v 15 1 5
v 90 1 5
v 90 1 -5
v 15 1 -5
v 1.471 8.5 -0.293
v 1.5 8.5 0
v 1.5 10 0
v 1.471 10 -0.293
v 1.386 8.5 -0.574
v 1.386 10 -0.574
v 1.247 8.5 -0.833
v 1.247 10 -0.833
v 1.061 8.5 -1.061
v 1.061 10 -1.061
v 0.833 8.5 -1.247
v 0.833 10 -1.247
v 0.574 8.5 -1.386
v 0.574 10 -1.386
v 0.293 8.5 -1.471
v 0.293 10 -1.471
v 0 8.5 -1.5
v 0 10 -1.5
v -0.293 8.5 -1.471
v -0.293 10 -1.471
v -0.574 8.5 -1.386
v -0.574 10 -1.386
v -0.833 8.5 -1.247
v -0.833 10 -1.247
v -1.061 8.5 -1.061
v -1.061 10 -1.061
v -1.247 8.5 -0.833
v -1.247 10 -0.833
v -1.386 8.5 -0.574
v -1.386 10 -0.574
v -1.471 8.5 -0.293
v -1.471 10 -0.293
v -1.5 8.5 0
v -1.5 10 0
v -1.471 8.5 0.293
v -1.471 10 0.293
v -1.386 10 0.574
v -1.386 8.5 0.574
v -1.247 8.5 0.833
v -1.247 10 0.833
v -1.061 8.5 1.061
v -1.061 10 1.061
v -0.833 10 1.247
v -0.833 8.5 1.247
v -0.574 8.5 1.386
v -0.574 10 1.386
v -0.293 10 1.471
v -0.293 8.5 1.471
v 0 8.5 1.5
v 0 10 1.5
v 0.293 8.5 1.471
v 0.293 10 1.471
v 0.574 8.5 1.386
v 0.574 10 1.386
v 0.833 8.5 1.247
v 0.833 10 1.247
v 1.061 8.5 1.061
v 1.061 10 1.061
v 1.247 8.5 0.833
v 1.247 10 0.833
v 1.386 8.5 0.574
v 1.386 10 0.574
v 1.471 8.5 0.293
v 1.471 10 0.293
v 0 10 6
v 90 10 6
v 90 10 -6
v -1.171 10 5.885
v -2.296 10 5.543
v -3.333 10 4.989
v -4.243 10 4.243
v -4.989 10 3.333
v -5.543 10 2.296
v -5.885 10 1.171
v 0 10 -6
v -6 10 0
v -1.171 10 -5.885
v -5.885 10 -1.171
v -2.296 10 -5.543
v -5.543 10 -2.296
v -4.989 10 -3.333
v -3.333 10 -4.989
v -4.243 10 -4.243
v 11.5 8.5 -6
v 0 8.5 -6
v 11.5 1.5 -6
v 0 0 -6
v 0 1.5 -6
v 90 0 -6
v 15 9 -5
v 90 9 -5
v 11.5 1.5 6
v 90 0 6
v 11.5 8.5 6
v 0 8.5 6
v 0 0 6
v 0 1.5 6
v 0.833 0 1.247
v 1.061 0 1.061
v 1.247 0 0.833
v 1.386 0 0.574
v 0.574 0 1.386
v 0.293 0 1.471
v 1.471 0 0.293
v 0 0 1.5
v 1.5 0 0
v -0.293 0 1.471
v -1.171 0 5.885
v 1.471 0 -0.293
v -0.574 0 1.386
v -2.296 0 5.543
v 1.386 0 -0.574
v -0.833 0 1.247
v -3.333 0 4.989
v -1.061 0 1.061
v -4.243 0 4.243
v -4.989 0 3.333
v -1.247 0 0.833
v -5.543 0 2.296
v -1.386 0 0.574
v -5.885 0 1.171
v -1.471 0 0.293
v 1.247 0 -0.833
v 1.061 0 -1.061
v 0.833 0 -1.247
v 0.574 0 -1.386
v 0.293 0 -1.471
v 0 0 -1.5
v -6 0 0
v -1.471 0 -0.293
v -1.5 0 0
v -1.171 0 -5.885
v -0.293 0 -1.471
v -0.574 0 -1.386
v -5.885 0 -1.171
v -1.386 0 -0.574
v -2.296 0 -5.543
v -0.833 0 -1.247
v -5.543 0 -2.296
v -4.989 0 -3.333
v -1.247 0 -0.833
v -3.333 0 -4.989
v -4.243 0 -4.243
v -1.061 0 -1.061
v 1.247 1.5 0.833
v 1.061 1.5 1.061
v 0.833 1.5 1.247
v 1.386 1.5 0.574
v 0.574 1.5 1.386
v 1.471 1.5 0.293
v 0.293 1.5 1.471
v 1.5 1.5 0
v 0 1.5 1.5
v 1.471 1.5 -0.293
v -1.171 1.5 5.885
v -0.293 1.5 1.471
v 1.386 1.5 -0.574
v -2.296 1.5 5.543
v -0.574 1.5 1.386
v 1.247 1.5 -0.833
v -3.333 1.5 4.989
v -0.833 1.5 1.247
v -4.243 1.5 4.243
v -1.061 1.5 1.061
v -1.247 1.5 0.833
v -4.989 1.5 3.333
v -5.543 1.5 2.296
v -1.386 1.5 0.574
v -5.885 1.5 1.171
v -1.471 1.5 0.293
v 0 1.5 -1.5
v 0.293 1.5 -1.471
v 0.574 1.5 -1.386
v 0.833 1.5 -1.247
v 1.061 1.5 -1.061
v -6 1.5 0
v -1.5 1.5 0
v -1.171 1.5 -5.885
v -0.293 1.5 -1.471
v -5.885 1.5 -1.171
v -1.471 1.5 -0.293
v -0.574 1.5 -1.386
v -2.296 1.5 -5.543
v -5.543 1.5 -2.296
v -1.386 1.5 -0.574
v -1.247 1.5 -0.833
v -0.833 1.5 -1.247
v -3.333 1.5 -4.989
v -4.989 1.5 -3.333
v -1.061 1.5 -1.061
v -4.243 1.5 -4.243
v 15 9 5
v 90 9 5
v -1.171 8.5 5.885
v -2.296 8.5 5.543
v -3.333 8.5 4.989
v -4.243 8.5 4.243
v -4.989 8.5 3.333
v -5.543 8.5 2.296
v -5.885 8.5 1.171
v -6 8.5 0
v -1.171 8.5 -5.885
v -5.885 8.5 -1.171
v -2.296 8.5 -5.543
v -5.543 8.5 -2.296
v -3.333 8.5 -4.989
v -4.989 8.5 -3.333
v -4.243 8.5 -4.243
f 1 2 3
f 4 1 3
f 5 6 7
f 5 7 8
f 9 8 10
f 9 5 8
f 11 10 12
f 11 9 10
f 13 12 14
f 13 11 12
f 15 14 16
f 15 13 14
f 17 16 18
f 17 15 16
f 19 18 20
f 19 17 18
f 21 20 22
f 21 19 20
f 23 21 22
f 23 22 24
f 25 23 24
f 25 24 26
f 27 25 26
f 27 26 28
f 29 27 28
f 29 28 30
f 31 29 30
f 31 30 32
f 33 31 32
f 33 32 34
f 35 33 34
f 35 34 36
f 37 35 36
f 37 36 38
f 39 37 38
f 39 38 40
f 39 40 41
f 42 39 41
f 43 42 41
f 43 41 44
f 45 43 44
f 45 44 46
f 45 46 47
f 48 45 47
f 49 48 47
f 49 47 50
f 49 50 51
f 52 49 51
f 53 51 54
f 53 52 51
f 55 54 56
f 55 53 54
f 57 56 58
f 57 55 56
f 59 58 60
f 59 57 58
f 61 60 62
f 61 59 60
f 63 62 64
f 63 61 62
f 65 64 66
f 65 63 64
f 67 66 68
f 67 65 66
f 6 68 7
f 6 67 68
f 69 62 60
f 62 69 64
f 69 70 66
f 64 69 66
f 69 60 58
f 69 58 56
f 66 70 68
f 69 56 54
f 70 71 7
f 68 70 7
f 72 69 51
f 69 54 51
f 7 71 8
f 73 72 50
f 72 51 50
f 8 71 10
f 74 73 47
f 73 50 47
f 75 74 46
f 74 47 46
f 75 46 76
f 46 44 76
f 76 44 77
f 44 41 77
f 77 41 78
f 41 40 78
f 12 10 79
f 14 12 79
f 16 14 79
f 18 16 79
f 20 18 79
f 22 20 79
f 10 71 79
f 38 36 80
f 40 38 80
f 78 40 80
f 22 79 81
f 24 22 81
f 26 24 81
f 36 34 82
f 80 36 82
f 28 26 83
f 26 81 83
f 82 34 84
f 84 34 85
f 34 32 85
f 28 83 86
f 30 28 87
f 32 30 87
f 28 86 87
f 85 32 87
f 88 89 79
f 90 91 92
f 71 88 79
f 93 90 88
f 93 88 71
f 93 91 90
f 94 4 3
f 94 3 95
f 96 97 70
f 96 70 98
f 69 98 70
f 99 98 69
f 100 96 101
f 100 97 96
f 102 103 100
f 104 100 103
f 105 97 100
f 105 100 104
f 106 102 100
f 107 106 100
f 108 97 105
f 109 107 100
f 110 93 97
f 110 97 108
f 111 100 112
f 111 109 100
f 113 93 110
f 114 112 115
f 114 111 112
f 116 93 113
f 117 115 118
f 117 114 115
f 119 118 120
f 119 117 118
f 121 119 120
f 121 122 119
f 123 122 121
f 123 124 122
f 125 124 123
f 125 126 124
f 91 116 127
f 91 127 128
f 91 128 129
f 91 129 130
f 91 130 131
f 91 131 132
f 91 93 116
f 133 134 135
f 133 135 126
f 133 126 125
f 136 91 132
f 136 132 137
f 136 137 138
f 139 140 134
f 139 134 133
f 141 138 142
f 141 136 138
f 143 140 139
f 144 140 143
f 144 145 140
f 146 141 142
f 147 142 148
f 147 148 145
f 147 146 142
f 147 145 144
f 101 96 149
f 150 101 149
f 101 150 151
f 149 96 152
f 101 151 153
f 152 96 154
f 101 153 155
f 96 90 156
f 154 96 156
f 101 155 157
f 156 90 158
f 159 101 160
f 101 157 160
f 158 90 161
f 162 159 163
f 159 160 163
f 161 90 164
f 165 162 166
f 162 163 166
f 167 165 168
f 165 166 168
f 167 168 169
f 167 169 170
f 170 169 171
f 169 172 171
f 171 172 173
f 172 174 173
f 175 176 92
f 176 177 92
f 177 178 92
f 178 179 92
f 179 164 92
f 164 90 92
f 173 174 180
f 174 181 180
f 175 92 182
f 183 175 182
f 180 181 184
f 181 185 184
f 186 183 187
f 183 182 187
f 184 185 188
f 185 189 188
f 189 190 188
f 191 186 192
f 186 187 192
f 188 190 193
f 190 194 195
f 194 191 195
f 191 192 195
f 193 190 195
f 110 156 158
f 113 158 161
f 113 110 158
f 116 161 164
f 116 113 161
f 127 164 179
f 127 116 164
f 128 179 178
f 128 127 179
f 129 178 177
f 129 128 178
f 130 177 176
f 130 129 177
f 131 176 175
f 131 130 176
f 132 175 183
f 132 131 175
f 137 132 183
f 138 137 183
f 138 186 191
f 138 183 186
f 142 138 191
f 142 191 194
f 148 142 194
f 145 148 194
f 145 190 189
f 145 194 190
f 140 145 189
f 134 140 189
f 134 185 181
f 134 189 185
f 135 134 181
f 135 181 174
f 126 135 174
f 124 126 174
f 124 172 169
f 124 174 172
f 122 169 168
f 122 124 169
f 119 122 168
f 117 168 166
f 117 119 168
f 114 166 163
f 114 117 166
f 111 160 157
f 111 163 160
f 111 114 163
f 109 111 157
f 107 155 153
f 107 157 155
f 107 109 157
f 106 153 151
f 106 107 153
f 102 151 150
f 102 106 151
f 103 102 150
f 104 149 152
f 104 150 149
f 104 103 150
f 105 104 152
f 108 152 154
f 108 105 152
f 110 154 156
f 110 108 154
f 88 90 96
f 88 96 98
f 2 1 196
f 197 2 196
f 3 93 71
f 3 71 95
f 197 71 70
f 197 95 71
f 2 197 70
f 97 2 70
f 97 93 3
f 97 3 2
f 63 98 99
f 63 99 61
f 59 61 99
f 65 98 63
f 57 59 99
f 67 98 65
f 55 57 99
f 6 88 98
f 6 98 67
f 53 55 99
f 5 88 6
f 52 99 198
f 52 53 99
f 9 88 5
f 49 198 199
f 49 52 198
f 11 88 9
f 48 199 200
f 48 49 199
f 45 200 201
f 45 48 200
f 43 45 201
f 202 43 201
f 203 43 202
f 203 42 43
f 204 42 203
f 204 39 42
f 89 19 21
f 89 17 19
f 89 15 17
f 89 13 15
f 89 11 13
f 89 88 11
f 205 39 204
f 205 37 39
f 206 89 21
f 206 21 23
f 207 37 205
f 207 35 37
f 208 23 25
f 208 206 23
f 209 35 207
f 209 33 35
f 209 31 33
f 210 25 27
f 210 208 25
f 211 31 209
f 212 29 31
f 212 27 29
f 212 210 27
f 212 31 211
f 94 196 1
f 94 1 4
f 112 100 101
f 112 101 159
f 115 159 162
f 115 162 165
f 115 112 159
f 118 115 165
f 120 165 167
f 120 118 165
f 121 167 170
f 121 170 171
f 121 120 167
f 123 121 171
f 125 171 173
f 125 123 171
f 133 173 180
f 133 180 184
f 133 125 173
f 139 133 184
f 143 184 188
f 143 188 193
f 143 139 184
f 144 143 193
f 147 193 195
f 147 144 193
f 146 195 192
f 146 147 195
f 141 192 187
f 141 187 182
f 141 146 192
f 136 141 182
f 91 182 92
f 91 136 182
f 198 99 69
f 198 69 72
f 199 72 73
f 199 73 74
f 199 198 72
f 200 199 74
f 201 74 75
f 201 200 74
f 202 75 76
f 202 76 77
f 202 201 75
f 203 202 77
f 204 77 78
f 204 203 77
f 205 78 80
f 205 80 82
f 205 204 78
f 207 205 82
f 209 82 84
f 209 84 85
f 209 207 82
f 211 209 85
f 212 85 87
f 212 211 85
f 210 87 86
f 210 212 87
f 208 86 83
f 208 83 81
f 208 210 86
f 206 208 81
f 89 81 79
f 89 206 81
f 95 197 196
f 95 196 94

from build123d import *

# Parameters (mm, degrees)
SZKIC1_R                    = 1.5
DODANIE_WYCI_GNI_CIE1_DEPTH = 10
SZKIC2_W                    = 35
SZKIC2_H                    = 7
WYTNIJ_WYCI_GNI_CIE1_DEPTH  = 13
SZKIC3_W                    = 10
SZKIC3_H                    = 8
WYTNIJ_WYCI_GNI_CIE2_DEPTH  = 75


with BuildPart() as part:
    # Szkic1 → Dodanie-wyciągnięcie1 (new body)
    with BuildSketch(Plane(origin=(0, 0, 0), x_dir=(1, 0, 0), z_dir=(0, 1, 0))):
        with BuildLine():
            Line((0, 6), (90, 6))
            Line((90, 6), (90, -6))
            Line((90, -6), (0, -6))
            ThreePointArc((0, -6), (-6, 0), (0, 6))
        make_face()
        Circle(SZKIC1_R, mode=Mode.SUBTRACT)
    extrude(amount=DODANIE_WYCI_GNI_CIE1_DEPTH)

    # Szkic2 → Wytnij-wyciągnięcie1 (cut, through all)
    with BuildSketch(Plane(origin=(0, 0, -6), x_dir=(-1, 0, 0), z_dir=(0, 0, -1))):
        with Locations((6, 5)):
            Rectangle(SZKIC2_W, SZKIC2_H)
    extrude(amount=-WYTNIJ_WYCI_GNI_CIE1_DEPTH, mode=Mode.SUBTRACT)

    # Szkic3 → Wytnij-wyciągnięcie2 (cut)
    with BuildSketch(Plane(origin=(90, 0, 0), x_dir=(0, 0, -1), z_dir=(1, 0, 0))):
        with Locations((0, 5)):
            Rectangle(SZKIC3_W, SZKIC3_H)
    extrude(amount=-WYTNIJ_WYCI_GNI_CIE2_DEPTH, mode=Mode.SUBTRACT)


solid = part.part
